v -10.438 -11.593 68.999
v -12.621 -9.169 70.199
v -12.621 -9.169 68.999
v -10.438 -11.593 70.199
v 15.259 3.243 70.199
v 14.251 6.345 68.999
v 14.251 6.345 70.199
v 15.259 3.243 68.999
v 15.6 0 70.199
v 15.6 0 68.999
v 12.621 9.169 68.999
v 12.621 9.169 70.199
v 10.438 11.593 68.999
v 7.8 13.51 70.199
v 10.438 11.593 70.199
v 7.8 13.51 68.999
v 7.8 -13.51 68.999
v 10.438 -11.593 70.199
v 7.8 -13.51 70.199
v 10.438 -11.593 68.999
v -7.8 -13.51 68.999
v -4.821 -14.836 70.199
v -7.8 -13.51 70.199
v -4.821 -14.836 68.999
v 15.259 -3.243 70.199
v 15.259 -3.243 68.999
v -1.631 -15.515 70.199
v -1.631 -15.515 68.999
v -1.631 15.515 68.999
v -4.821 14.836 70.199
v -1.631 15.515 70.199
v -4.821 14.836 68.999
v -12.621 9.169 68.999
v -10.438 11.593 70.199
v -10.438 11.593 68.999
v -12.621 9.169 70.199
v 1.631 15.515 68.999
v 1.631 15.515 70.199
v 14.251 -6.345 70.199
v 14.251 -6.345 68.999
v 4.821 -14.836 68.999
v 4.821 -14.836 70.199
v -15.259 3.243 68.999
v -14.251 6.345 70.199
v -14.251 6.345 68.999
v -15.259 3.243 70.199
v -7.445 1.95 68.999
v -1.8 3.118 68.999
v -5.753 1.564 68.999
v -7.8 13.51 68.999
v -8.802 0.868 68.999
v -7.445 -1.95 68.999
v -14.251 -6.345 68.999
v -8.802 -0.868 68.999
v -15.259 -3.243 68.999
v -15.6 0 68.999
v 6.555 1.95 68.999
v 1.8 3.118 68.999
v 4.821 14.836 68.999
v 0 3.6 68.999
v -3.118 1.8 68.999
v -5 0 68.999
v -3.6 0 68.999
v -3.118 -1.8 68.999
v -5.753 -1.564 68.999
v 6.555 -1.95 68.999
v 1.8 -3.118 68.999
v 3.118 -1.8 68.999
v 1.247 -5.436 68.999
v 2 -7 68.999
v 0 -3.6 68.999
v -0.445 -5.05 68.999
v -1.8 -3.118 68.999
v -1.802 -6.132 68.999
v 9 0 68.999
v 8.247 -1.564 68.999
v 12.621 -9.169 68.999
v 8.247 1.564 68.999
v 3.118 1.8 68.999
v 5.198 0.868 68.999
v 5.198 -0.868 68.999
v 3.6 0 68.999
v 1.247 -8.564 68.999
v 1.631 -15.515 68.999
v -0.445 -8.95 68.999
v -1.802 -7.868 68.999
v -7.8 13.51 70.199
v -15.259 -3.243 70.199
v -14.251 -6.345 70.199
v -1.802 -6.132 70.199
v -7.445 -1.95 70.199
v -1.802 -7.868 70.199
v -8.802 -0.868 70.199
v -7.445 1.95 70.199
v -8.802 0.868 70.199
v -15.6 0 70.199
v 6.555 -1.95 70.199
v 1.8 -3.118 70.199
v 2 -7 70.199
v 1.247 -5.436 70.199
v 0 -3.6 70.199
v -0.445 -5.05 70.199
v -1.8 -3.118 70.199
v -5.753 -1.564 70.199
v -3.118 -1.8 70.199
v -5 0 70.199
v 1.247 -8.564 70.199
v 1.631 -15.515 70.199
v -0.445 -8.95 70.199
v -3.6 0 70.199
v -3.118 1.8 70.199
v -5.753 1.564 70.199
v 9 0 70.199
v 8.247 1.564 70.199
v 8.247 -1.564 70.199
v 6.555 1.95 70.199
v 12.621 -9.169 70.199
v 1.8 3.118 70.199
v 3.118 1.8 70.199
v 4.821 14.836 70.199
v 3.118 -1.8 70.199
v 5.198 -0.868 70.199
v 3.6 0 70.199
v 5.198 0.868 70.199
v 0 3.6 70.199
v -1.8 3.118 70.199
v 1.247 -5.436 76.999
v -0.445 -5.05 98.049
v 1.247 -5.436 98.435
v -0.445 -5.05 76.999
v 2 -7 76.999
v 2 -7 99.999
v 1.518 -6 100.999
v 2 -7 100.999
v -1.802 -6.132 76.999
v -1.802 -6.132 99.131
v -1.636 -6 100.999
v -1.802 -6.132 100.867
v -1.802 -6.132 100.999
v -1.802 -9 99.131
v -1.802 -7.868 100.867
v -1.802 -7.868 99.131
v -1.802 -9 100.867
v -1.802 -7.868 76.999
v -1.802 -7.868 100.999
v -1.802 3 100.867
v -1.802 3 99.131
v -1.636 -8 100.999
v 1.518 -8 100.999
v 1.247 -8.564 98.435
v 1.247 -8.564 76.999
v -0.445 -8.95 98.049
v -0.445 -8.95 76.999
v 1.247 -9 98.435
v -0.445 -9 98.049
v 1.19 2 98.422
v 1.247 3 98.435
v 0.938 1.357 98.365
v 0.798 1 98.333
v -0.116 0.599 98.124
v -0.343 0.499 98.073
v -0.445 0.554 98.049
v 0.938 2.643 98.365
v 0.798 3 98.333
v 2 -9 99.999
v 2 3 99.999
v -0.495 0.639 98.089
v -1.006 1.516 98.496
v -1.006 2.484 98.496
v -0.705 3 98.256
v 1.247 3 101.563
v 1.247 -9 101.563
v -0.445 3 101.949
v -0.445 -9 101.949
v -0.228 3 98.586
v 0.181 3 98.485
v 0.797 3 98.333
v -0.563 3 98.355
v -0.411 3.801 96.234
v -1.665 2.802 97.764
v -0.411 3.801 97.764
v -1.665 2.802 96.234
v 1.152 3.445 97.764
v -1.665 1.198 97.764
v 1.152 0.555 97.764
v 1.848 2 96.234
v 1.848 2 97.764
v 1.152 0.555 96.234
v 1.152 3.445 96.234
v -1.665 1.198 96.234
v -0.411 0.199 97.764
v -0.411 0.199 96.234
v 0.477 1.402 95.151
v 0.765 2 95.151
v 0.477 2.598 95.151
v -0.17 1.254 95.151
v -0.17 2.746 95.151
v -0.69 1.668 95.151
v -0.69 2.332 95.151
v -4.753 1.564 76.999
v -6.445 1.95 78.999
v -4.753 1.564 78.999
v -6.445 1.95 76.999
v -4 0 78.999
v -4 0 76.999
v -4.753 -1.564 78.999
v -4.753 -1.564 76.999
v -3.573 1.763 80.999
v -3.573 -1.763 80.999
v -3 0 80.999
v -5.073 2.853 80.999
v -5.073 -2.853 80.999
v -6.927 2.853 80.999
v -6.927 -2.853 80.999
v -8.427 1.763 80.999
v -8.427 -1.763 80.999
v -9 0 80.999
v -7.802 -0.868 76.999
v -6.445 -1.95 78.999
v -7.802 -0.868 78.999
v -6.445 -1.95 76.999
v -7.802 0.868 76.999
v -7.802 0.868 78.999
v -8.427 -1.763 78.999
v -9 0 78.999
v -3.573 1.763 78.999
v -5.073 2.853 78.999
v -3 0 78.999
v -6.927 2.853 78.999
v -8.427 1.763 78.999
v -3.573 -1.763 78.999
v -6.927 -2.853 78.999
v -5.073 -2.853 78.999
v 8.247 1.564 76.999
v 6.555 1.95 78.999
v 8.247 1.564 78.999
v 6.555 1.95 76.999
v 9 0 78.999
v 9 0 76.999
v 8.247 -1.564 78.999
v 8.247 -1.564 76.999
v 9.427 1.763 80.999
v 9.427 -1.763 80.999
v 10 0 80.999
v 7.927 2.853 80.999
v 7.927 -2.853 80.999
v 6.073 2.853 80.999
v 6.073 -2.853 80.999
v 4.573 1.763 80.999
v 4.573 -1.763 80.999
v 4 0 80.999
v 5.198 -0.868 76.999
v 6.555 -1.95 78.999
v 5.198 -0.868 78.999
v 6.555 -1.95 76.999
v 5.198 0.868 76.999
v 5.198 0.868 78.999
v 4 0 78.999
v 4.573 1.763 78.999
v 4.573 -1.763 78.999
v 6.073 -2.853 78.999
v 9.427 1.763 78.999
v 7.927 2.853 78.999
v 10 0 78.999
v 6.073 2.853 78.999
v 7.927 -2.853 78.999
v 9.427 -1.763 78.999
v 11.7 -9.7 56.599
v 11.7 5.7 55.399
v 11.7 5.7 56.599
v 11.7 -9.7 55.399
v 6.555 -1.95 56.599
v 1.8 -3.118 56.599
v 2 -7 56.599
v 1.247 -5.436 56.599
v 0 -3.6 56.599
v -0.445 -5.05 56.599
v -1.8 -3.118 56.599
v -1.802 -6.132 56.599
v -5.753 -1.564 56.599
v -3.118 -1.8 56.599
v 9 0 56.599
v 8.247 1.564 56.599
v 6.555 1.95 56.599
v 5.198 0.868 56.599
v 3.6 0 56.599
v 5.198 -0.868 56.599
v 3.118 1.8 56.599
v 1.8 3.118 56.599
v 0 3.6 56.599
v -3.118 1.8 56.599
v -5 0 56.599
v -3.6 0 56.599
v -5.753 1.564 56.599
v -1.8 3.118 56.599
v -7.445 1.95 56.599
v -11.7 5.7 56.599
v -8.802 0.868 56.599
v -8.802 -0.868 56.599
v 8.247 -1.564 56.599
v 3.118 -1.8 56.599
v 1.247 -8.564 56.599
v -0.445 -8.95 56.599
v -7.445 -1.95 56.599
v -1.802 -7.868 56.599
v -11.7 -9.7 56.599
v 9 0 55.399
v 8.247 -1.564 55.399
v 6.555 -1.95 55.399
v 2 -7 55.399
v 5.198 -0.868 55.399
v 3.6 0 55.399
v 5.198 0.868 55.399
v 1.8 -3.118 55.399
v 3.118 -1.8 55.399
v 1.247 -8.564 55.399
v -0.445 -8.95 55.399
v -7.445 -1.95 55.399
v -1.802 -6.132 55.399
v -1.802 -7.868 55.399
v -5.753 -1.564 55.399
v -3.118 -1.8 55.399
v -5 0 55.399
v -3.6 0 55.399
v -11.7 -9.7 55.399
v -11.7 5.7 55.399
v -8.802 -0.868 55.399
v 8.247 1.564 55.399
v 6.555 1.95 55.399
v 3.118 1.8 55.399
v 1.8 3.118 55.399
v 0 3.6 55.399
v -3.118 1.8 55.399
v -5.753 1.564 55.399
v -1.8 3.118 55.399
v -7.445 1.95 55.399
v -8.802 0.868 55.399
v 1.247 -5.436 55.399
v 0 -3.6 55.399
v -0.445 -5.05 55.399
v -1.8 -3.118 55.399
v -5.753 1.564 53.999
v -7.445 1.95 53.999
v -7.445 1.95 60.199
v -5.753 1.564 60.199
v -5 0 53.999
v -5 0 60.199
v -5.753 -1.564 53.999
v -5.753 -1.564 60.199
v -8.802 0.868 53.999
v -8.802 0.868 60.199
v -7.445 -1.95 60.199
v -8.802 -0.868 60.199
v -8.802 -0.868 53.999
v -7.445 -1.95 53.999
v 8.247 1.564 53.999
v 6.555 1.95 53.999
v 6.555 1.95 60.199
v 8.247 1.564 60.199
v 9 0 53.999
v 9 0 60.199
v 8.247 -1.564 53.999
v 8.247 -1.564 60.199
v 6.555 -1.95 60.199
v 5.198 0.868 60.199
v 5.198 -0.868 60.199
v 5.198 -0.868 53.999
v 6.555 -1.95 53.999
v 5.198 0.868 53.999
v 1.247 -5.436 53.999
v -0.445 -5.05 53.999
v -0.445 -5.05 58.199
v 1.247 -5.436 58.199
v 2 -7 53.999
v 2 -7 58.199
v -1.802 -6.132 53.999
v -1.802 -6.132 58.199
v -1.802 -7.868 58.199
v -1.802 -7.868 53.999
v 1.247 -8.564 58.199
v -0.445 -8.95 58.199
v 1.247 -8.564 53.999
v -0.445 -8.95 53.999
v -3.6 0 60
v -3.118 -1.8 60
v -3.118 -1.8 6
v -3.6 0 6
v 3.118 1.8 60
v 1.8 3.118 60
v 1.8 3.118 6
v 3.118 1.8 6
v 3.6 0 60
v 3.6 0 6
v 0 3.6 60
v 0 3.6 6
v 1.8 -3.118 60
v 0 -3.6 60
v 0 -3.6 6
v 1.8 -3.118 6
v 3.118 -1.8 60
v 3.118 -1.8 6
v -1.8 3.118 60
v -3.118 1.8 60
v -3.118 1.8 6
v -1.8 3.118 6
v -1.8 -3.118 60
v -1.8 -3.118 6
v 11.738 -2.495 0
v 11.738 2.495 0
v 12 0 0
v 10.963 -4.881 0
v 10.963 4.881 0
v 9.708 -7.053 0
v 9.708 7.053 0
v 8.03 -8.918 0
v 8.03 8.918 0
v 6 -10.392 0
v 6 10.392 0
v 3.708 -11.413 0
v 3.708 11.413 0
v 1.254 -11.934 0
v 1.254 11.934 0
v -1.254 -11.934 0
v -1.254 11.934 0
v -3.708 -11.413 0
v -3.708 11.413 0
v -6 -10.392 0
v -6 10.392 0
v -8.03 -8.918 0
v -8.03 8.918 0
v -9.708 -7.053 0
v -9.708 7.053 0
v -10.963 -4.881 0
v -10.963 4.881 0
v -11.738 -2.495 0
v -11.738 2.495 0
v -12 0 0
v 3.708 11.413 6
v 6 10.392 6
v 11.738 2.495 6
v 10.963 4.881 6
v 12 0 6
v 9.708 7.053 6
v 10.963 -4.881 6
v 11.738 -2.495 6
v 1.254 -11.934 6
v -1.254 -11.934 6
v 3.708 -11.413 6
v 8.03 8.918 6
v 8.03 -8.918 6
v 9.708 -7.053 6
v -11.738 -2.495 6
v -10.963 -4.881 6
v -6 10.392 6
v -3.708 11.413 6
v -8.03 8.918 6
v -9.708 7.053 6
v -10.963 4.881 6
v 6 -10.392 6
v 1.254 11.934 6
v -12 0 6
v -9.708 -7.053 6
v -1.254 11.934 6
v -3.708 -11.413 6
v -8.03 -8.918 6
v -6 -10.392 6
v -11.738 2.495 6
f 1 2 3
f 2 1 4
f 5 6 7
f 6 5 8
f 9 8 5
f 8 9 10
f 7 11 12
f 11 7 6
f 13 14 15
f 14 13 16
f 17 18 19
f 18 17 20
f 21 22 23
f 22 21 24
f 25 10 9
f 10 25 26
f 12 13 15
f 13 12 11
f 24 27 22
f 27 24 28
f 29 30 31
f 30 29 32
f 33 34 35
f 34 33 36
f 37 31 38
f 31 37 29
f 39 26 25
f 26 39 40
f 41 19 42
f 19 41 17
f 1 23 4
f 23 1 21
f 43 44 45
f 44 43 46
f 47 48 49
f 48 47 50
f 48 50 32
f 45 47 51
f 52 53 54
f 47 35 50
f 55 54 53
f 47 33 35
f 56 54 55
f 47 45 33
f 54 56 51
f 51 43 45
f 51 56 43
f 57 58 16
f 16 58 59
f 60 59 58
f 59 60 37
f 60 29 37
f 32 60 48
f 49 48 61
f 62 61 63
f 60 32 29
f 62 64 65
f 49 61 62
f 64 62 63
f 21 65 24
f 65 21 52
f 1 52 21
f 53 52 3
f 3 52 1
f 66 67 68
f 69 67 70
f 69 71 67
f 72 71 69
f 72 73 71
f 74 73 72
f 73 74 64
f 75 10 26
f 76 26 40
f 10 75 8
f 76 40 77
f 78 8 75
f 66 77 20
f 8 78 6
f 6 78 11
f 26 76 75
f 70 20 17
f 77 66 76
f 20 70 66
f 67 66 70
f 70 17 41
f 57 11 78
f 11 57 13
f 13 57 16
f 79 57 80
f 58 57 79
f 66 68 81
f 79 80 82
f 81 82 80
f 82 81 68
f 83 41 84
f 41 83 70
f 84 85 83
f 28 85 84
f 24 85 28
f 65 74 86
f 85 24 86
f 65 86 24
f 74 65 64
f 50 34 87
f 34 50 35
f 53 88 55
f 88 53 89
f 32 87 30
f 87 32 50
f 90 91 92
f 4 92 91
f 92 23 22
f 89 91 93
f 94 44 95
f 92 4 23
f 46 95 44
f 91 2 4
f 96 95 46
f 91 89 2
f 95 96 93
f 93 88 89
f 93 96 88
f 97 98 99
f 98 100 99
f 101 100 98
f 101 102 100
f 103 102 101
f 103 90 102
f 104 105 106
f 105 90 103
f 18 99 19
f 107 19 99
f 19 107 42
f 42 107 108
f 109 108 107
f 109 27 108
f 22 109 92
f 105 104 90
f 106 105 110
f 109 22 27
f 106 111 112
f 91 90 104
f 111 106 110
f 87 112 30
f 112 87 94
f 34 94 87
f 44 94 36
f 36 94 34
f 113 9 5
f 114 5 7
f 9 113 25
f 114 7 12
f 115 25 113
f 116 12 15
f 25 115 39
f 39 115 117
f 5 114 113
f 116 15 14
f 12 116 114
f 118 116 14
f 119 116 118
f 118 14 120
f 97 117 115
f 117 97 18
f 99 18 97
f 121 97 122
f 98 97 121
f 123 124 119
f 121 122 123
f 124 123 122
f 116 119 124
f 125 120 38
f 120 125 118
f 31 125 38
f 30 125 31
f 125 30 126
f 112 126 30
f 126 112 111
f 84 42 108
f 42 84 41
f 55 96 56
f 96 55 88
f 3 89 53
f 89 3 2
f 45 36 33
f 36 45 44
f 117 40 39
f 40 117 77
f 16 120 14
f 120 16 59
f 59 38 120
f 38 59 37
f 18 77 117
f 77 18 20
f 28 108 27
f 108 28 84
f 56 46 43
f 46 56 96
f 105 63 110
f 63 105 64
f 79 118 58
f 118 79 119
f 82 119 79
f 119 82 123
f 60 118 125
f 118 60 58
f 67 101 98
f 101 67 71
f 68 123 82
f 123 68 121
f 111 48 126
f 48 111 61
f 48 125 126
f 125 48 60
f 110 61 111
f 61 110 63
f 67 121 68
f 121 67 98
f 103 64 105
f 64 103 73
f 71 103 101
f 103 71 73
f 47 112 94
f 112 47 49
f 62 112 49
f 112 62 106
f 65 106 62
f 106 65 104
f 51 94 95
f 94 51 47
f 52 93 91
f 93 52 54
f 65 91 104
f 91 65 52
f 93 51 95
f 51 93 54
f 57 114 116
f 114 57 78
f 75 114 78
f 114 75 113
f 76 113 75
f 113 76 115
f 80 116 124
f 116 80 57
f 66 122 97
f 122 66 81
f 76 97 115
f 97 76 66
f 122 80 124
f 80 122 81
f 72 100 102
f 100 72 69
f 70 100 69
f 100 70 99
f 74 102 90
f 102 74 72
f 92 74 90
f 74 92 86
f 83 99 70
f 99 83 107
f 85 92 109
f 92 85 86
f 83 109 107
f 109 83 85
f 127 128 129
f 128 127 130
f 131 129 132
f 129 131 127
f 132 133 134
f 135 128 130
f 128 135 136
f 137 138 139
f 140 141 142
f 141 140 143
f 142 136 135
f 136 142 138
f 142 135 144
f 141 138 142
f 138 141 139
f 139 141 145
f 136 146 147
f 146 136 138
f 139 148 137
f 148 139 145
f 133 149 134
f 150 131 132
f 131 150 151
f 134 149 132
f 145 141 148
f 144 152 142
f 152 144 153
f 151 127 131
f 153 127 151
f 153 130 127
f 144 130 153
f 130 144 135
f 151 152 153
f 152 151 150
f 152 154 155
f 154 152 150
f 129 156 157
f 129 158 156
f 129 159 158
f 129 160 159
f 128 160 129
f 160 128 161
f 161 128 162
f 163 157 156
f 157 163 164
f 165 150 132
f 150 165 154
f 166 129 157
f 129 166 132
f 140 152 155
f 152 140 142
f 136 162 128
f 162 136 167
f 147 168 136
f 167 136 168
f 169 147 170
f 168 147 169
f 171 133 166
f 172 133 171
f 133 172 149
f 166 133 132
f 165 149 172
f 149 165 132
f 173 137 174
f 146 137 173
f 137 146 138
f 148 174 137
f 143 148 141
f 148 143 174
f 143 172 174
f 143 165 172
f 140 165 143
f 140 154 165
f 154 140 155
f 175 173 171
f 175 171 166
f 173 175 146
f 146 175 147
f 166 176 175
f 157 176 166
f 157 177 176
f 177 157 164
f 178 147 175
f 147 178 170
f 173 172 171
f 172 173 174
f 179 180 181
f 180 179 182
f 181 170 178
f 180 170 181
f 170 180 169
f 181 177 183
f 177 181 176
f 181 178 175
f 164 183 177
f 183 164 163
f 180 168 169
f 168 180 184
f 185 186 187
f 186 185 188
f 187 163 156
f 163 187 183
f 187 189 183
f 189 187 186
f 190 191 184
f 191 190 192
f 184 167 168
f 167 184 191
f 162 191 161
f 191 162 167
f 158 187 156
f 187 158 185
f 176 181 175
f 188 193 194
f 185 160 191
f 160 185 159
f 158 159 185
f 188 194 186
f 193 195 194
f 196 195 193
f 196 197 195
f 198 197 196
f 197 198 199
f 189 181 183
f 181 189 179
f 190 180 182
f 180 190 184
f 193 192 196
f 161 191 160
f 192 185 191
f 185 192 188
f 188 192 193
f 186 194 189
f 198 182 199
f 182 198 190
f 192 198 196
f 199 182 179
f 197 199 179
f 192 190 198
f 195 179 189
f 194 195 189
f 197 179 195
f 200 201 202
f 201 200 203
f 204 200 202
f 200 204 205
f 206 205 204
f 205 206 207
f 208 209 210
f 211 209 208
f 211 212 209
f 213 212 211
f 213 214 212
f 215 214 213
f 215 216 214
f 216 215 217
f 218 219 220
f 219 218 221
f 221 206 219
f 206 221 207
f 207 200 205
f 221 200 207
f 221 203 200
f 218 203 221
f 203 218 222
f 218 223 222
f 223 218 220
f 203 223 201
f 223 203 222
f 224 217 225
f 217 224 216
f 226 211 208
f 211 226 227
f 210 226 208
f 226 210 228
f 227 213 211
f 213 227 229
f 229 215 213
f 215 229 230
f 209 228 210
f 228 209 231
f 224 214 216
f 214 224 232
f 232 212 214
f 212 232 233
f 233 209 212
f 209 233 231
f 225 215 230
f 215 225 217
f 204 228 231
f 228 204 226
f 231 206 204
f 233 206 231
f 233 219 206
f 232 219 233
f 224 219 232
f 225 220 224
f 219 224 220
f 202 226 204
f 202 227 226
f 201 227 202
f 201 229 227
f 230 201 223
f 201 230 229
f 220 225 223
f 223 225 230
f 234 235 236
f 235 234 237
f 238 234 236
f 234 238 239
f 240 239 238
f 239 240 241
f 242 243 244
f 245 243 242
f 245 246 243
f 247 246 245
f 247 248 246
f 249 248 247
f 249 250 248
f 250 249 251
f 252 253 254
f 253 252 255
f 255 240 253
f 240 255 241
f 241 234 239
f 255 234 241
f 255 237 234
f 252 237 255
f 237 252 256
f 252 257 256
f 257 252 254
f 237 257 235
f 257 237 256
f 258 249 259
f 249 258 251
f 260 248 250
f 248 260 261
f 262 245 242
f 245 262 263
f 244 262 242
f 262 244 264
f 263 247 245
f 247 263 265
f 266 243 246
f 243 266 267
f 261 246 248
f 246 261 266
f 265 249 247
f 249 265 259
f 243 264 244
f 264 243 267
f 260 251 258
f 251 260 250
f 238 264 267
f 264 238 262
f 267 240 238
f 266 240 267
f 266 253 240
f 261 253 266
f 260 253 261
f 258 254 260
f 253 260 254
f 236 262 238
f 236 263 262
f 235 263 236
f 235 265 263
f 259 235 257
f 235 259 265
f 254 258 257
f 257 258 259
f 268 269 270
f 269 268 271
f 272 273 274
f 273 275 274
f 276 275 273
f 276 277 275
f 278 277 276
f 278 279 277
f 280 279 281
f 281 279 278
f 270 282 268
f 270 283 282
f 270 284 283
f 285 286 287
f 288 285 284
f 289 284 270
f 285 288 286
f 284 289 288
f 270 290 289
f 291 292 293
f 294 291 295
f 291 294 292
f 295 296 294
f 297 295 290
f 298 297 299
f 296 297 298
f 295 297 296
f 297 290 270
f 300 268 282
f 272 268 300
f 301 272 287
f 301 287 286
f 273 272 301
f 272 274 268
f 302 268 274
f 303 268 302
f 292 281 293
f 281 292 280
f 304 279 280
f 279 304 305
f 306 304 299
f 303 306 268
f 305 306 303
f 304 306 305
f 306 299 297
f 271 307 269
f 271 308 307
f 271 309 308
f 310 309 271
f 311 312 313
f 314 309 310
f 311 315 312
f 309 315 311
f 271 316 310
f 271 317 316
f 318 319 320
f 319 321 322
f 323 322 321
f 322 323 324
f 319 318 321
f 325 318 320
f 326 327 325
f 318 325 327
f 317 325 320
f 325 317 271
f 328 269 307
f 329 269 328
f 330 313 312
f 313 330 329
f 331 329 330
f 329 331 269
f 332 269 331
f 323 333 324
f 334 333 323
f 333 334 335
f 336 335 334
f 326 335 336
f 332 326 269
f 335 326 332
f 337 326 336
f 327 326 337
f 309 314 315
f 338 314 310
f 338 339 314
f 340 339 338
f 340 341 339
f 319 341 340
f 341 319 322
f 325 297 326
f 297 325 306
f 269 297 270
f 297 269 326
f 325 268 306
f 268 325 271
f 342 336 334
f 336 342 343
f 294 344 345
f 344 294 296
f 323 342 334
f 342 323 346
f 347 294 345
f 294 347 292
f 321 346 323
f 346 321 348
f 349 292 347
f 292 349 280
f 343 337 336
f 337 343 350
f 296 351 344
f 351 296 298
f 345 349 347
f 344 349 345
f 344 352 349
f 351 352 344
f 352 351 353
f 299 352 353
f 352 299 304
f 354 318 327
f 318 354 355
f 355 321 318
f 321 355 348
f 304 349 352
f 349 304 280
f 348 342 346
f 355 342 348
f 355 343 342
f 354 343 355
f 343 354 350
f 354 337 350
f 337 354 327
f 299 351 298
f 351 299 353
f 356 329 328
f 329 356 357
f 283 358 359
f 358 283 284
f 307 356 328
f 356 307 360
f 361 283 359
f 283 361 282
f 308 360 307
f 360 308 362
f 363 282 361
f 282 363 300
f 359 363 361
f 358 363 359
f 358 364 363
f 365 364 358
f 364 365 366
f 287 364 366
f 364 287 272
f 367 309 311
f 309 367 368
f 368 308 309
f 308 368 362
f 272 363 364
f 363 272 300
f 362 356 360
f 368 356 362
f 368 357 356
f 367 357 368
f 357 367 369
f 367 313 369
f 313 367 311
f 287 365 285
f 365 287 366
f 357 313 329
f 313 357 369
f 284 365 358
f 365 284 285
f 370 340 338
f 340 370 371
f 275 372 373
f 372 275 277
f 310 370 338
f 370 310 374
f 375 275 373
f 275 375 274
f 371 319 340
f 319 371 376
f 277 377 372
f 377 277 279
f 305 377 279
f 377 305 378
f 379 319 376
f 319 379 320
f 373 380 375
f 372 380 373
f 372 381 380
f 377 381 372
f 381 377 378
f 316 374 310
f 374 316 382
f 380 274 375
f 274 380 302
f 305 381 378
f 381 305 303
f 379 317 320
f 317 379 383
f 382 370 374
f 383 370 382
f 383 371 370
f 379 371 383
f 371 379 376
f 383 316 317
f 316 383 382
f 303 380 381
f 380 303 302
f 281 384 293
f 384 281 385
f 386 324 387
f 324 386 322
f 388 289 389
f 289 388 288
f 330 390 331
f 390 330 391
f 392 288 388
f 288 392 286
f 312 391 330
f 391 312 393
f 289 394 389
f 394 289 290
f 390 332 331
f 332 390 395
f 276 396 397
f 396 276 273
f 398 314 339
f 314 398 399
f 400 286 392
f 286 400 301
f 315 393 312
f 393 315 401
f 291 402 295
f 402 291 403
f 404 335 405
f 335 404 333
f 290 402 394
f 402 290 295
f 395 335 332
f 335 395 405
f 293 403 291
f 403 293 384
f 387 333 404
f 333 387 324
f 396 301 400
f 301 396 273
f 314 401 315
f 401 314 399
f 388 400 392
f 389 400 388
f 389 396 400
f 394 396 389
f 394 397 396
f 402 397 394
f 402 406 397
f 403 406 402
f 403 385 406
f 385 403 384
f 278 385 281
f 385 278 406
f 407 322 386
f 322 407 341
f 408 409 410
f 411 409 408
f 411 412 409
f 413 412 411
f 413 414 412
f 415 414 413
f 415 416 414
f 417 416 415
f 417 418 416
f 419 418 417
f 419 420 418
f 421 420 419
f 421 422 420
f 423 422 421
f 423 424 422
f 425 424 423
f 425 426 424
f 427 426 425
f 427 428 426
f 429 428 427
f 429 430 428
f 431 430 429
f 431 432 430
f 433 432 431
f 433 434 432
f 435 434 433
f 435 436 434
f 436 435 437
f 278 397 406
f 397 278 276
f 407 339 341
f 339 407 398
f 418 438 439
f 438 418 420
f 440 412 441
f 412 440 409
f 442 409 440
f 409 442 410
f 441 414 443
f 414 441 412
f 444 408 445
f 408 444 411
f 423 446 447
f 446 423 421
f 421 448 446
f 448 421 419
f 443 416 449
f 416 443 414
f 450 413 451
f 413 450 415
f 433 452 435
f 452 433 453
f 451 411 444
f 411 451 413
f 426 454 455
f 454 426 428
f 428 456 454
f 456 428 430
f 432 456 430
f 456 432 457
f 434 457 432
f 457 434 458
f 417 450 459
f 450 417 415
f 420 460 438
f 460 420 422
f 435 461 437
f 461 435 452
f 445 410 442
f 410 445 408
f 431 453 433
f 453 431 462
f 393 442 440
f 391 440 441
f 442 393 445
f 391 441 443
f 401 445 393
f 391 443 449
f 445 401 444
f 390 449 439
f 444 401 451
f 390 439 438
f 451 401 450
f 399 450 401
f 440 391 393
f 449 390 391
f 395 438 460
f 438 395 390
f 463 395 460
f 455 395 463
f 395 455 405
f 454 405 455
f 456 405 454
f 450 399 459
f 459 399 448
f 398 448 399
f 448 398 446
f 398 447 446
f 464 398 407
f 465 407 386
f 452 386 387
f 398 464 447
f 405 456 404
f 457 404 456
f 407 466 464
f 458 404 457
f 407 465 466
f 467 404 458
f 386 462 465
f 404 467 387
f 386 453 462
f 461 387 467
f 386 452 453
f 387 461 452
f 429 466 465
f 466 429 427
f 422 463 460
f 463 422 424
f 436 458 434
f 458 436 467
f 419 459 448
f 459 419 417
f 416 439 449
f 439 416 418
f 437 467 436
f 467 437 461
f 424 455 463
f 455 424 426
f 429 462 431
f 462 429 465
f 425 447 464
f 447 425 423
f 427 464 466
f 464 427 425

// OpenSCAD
baseHeight = 6;
baseRadius = 12;

stemHeight = 60;
stemRadius = baseRadius*0.3;

table();

module table()
{
    union()
    {
        top();

        mountingArea();

        stem();

        base();
    }
}

module top()
{
    yTranslate = stemHeight - 0.001 + 9;
    topRadius = baseRadius * 1.3;
    topHeight = baseHeight * 0.2;

    union()
    {
        difference()
        {
            color("brown")
            translate([0, 0, yTranslate])
            cylinder(r = topRadius, h = topHeight);

            // stem hole
            translate([0, 0, yTranslate-2])
            cylinder(r = stemRadius, h = topHeight +5);            

            translate([-7, 0, yTranslate-2])
            cylinder(r = 2, h = topHeight +5);

            translate([7, 0, yTranslate-2])
            cylinder(r = 2, h = topHeight +5);

            // ornament hole
            translate([0, -7, yTranslate-2])
            cylinder(r = 2, h = topHeight +5);
        }

        // ornament
        color("blue")
        translate([0, -7, yTranslate+8])
        cylinder(r = 2, h = 24);

        color("blue")
        translate([0, -9, yTranslate+8 +23])
        rotate([-90,0,0])
        cylinder(r = 2, h = 12);

        translate([0, 2, yTranslate+8 +20])
        sphere(r=2);

        // fastener 1
        color("gray")
        translate([-6, -0, yTranslate+8])
        cylinder(r = 2, h = 4);
        color("gray")
        translate([-6, -0, yTranslate+10])
        cylinder(r = 3, h = 2);

        // fastener 1
        color("gray")
        translate([7, -0, yTranslate+8])
        cylinder(r = 2, h = 4);
        color("gray")
        translate([7, -0, yTranslate+10])
        cylinder(r = 3, h = 2);
    }    
}


module mountingArea()
{
    yTranslate = stemHeight - 0.001 - 4;
    topRadius = baseRadius * 1.2;
    topHeight = baseHeight * 0.2;

    union()
    {
        {
            side = topRadius + 9;
            color("orange")
            translate([0, -2, yTranslate])
            cube([side, side-8, topHeight], center = true);

            // symetric post 1
            translate([-7, 0, yTranslate-2])
            cylinder(r = 2, h = topHeight +5);

            // symetric post 2
            translate([7, 0, yTranslate-2])
            cylinder(r = 2, h = topHeight +5);

            // ornament post
            color("blue")
            translate([0, -7, yTranslate-2])
            cylinder(r = 2, h = topHeight + 3);
        }
    }
}

module stem()
{
    cylinder(r=stemRadius, h = stemHeight);
}

module base()
{
    color("red")
    cylinder(r=baseRadius, h = baseHeight);
}
